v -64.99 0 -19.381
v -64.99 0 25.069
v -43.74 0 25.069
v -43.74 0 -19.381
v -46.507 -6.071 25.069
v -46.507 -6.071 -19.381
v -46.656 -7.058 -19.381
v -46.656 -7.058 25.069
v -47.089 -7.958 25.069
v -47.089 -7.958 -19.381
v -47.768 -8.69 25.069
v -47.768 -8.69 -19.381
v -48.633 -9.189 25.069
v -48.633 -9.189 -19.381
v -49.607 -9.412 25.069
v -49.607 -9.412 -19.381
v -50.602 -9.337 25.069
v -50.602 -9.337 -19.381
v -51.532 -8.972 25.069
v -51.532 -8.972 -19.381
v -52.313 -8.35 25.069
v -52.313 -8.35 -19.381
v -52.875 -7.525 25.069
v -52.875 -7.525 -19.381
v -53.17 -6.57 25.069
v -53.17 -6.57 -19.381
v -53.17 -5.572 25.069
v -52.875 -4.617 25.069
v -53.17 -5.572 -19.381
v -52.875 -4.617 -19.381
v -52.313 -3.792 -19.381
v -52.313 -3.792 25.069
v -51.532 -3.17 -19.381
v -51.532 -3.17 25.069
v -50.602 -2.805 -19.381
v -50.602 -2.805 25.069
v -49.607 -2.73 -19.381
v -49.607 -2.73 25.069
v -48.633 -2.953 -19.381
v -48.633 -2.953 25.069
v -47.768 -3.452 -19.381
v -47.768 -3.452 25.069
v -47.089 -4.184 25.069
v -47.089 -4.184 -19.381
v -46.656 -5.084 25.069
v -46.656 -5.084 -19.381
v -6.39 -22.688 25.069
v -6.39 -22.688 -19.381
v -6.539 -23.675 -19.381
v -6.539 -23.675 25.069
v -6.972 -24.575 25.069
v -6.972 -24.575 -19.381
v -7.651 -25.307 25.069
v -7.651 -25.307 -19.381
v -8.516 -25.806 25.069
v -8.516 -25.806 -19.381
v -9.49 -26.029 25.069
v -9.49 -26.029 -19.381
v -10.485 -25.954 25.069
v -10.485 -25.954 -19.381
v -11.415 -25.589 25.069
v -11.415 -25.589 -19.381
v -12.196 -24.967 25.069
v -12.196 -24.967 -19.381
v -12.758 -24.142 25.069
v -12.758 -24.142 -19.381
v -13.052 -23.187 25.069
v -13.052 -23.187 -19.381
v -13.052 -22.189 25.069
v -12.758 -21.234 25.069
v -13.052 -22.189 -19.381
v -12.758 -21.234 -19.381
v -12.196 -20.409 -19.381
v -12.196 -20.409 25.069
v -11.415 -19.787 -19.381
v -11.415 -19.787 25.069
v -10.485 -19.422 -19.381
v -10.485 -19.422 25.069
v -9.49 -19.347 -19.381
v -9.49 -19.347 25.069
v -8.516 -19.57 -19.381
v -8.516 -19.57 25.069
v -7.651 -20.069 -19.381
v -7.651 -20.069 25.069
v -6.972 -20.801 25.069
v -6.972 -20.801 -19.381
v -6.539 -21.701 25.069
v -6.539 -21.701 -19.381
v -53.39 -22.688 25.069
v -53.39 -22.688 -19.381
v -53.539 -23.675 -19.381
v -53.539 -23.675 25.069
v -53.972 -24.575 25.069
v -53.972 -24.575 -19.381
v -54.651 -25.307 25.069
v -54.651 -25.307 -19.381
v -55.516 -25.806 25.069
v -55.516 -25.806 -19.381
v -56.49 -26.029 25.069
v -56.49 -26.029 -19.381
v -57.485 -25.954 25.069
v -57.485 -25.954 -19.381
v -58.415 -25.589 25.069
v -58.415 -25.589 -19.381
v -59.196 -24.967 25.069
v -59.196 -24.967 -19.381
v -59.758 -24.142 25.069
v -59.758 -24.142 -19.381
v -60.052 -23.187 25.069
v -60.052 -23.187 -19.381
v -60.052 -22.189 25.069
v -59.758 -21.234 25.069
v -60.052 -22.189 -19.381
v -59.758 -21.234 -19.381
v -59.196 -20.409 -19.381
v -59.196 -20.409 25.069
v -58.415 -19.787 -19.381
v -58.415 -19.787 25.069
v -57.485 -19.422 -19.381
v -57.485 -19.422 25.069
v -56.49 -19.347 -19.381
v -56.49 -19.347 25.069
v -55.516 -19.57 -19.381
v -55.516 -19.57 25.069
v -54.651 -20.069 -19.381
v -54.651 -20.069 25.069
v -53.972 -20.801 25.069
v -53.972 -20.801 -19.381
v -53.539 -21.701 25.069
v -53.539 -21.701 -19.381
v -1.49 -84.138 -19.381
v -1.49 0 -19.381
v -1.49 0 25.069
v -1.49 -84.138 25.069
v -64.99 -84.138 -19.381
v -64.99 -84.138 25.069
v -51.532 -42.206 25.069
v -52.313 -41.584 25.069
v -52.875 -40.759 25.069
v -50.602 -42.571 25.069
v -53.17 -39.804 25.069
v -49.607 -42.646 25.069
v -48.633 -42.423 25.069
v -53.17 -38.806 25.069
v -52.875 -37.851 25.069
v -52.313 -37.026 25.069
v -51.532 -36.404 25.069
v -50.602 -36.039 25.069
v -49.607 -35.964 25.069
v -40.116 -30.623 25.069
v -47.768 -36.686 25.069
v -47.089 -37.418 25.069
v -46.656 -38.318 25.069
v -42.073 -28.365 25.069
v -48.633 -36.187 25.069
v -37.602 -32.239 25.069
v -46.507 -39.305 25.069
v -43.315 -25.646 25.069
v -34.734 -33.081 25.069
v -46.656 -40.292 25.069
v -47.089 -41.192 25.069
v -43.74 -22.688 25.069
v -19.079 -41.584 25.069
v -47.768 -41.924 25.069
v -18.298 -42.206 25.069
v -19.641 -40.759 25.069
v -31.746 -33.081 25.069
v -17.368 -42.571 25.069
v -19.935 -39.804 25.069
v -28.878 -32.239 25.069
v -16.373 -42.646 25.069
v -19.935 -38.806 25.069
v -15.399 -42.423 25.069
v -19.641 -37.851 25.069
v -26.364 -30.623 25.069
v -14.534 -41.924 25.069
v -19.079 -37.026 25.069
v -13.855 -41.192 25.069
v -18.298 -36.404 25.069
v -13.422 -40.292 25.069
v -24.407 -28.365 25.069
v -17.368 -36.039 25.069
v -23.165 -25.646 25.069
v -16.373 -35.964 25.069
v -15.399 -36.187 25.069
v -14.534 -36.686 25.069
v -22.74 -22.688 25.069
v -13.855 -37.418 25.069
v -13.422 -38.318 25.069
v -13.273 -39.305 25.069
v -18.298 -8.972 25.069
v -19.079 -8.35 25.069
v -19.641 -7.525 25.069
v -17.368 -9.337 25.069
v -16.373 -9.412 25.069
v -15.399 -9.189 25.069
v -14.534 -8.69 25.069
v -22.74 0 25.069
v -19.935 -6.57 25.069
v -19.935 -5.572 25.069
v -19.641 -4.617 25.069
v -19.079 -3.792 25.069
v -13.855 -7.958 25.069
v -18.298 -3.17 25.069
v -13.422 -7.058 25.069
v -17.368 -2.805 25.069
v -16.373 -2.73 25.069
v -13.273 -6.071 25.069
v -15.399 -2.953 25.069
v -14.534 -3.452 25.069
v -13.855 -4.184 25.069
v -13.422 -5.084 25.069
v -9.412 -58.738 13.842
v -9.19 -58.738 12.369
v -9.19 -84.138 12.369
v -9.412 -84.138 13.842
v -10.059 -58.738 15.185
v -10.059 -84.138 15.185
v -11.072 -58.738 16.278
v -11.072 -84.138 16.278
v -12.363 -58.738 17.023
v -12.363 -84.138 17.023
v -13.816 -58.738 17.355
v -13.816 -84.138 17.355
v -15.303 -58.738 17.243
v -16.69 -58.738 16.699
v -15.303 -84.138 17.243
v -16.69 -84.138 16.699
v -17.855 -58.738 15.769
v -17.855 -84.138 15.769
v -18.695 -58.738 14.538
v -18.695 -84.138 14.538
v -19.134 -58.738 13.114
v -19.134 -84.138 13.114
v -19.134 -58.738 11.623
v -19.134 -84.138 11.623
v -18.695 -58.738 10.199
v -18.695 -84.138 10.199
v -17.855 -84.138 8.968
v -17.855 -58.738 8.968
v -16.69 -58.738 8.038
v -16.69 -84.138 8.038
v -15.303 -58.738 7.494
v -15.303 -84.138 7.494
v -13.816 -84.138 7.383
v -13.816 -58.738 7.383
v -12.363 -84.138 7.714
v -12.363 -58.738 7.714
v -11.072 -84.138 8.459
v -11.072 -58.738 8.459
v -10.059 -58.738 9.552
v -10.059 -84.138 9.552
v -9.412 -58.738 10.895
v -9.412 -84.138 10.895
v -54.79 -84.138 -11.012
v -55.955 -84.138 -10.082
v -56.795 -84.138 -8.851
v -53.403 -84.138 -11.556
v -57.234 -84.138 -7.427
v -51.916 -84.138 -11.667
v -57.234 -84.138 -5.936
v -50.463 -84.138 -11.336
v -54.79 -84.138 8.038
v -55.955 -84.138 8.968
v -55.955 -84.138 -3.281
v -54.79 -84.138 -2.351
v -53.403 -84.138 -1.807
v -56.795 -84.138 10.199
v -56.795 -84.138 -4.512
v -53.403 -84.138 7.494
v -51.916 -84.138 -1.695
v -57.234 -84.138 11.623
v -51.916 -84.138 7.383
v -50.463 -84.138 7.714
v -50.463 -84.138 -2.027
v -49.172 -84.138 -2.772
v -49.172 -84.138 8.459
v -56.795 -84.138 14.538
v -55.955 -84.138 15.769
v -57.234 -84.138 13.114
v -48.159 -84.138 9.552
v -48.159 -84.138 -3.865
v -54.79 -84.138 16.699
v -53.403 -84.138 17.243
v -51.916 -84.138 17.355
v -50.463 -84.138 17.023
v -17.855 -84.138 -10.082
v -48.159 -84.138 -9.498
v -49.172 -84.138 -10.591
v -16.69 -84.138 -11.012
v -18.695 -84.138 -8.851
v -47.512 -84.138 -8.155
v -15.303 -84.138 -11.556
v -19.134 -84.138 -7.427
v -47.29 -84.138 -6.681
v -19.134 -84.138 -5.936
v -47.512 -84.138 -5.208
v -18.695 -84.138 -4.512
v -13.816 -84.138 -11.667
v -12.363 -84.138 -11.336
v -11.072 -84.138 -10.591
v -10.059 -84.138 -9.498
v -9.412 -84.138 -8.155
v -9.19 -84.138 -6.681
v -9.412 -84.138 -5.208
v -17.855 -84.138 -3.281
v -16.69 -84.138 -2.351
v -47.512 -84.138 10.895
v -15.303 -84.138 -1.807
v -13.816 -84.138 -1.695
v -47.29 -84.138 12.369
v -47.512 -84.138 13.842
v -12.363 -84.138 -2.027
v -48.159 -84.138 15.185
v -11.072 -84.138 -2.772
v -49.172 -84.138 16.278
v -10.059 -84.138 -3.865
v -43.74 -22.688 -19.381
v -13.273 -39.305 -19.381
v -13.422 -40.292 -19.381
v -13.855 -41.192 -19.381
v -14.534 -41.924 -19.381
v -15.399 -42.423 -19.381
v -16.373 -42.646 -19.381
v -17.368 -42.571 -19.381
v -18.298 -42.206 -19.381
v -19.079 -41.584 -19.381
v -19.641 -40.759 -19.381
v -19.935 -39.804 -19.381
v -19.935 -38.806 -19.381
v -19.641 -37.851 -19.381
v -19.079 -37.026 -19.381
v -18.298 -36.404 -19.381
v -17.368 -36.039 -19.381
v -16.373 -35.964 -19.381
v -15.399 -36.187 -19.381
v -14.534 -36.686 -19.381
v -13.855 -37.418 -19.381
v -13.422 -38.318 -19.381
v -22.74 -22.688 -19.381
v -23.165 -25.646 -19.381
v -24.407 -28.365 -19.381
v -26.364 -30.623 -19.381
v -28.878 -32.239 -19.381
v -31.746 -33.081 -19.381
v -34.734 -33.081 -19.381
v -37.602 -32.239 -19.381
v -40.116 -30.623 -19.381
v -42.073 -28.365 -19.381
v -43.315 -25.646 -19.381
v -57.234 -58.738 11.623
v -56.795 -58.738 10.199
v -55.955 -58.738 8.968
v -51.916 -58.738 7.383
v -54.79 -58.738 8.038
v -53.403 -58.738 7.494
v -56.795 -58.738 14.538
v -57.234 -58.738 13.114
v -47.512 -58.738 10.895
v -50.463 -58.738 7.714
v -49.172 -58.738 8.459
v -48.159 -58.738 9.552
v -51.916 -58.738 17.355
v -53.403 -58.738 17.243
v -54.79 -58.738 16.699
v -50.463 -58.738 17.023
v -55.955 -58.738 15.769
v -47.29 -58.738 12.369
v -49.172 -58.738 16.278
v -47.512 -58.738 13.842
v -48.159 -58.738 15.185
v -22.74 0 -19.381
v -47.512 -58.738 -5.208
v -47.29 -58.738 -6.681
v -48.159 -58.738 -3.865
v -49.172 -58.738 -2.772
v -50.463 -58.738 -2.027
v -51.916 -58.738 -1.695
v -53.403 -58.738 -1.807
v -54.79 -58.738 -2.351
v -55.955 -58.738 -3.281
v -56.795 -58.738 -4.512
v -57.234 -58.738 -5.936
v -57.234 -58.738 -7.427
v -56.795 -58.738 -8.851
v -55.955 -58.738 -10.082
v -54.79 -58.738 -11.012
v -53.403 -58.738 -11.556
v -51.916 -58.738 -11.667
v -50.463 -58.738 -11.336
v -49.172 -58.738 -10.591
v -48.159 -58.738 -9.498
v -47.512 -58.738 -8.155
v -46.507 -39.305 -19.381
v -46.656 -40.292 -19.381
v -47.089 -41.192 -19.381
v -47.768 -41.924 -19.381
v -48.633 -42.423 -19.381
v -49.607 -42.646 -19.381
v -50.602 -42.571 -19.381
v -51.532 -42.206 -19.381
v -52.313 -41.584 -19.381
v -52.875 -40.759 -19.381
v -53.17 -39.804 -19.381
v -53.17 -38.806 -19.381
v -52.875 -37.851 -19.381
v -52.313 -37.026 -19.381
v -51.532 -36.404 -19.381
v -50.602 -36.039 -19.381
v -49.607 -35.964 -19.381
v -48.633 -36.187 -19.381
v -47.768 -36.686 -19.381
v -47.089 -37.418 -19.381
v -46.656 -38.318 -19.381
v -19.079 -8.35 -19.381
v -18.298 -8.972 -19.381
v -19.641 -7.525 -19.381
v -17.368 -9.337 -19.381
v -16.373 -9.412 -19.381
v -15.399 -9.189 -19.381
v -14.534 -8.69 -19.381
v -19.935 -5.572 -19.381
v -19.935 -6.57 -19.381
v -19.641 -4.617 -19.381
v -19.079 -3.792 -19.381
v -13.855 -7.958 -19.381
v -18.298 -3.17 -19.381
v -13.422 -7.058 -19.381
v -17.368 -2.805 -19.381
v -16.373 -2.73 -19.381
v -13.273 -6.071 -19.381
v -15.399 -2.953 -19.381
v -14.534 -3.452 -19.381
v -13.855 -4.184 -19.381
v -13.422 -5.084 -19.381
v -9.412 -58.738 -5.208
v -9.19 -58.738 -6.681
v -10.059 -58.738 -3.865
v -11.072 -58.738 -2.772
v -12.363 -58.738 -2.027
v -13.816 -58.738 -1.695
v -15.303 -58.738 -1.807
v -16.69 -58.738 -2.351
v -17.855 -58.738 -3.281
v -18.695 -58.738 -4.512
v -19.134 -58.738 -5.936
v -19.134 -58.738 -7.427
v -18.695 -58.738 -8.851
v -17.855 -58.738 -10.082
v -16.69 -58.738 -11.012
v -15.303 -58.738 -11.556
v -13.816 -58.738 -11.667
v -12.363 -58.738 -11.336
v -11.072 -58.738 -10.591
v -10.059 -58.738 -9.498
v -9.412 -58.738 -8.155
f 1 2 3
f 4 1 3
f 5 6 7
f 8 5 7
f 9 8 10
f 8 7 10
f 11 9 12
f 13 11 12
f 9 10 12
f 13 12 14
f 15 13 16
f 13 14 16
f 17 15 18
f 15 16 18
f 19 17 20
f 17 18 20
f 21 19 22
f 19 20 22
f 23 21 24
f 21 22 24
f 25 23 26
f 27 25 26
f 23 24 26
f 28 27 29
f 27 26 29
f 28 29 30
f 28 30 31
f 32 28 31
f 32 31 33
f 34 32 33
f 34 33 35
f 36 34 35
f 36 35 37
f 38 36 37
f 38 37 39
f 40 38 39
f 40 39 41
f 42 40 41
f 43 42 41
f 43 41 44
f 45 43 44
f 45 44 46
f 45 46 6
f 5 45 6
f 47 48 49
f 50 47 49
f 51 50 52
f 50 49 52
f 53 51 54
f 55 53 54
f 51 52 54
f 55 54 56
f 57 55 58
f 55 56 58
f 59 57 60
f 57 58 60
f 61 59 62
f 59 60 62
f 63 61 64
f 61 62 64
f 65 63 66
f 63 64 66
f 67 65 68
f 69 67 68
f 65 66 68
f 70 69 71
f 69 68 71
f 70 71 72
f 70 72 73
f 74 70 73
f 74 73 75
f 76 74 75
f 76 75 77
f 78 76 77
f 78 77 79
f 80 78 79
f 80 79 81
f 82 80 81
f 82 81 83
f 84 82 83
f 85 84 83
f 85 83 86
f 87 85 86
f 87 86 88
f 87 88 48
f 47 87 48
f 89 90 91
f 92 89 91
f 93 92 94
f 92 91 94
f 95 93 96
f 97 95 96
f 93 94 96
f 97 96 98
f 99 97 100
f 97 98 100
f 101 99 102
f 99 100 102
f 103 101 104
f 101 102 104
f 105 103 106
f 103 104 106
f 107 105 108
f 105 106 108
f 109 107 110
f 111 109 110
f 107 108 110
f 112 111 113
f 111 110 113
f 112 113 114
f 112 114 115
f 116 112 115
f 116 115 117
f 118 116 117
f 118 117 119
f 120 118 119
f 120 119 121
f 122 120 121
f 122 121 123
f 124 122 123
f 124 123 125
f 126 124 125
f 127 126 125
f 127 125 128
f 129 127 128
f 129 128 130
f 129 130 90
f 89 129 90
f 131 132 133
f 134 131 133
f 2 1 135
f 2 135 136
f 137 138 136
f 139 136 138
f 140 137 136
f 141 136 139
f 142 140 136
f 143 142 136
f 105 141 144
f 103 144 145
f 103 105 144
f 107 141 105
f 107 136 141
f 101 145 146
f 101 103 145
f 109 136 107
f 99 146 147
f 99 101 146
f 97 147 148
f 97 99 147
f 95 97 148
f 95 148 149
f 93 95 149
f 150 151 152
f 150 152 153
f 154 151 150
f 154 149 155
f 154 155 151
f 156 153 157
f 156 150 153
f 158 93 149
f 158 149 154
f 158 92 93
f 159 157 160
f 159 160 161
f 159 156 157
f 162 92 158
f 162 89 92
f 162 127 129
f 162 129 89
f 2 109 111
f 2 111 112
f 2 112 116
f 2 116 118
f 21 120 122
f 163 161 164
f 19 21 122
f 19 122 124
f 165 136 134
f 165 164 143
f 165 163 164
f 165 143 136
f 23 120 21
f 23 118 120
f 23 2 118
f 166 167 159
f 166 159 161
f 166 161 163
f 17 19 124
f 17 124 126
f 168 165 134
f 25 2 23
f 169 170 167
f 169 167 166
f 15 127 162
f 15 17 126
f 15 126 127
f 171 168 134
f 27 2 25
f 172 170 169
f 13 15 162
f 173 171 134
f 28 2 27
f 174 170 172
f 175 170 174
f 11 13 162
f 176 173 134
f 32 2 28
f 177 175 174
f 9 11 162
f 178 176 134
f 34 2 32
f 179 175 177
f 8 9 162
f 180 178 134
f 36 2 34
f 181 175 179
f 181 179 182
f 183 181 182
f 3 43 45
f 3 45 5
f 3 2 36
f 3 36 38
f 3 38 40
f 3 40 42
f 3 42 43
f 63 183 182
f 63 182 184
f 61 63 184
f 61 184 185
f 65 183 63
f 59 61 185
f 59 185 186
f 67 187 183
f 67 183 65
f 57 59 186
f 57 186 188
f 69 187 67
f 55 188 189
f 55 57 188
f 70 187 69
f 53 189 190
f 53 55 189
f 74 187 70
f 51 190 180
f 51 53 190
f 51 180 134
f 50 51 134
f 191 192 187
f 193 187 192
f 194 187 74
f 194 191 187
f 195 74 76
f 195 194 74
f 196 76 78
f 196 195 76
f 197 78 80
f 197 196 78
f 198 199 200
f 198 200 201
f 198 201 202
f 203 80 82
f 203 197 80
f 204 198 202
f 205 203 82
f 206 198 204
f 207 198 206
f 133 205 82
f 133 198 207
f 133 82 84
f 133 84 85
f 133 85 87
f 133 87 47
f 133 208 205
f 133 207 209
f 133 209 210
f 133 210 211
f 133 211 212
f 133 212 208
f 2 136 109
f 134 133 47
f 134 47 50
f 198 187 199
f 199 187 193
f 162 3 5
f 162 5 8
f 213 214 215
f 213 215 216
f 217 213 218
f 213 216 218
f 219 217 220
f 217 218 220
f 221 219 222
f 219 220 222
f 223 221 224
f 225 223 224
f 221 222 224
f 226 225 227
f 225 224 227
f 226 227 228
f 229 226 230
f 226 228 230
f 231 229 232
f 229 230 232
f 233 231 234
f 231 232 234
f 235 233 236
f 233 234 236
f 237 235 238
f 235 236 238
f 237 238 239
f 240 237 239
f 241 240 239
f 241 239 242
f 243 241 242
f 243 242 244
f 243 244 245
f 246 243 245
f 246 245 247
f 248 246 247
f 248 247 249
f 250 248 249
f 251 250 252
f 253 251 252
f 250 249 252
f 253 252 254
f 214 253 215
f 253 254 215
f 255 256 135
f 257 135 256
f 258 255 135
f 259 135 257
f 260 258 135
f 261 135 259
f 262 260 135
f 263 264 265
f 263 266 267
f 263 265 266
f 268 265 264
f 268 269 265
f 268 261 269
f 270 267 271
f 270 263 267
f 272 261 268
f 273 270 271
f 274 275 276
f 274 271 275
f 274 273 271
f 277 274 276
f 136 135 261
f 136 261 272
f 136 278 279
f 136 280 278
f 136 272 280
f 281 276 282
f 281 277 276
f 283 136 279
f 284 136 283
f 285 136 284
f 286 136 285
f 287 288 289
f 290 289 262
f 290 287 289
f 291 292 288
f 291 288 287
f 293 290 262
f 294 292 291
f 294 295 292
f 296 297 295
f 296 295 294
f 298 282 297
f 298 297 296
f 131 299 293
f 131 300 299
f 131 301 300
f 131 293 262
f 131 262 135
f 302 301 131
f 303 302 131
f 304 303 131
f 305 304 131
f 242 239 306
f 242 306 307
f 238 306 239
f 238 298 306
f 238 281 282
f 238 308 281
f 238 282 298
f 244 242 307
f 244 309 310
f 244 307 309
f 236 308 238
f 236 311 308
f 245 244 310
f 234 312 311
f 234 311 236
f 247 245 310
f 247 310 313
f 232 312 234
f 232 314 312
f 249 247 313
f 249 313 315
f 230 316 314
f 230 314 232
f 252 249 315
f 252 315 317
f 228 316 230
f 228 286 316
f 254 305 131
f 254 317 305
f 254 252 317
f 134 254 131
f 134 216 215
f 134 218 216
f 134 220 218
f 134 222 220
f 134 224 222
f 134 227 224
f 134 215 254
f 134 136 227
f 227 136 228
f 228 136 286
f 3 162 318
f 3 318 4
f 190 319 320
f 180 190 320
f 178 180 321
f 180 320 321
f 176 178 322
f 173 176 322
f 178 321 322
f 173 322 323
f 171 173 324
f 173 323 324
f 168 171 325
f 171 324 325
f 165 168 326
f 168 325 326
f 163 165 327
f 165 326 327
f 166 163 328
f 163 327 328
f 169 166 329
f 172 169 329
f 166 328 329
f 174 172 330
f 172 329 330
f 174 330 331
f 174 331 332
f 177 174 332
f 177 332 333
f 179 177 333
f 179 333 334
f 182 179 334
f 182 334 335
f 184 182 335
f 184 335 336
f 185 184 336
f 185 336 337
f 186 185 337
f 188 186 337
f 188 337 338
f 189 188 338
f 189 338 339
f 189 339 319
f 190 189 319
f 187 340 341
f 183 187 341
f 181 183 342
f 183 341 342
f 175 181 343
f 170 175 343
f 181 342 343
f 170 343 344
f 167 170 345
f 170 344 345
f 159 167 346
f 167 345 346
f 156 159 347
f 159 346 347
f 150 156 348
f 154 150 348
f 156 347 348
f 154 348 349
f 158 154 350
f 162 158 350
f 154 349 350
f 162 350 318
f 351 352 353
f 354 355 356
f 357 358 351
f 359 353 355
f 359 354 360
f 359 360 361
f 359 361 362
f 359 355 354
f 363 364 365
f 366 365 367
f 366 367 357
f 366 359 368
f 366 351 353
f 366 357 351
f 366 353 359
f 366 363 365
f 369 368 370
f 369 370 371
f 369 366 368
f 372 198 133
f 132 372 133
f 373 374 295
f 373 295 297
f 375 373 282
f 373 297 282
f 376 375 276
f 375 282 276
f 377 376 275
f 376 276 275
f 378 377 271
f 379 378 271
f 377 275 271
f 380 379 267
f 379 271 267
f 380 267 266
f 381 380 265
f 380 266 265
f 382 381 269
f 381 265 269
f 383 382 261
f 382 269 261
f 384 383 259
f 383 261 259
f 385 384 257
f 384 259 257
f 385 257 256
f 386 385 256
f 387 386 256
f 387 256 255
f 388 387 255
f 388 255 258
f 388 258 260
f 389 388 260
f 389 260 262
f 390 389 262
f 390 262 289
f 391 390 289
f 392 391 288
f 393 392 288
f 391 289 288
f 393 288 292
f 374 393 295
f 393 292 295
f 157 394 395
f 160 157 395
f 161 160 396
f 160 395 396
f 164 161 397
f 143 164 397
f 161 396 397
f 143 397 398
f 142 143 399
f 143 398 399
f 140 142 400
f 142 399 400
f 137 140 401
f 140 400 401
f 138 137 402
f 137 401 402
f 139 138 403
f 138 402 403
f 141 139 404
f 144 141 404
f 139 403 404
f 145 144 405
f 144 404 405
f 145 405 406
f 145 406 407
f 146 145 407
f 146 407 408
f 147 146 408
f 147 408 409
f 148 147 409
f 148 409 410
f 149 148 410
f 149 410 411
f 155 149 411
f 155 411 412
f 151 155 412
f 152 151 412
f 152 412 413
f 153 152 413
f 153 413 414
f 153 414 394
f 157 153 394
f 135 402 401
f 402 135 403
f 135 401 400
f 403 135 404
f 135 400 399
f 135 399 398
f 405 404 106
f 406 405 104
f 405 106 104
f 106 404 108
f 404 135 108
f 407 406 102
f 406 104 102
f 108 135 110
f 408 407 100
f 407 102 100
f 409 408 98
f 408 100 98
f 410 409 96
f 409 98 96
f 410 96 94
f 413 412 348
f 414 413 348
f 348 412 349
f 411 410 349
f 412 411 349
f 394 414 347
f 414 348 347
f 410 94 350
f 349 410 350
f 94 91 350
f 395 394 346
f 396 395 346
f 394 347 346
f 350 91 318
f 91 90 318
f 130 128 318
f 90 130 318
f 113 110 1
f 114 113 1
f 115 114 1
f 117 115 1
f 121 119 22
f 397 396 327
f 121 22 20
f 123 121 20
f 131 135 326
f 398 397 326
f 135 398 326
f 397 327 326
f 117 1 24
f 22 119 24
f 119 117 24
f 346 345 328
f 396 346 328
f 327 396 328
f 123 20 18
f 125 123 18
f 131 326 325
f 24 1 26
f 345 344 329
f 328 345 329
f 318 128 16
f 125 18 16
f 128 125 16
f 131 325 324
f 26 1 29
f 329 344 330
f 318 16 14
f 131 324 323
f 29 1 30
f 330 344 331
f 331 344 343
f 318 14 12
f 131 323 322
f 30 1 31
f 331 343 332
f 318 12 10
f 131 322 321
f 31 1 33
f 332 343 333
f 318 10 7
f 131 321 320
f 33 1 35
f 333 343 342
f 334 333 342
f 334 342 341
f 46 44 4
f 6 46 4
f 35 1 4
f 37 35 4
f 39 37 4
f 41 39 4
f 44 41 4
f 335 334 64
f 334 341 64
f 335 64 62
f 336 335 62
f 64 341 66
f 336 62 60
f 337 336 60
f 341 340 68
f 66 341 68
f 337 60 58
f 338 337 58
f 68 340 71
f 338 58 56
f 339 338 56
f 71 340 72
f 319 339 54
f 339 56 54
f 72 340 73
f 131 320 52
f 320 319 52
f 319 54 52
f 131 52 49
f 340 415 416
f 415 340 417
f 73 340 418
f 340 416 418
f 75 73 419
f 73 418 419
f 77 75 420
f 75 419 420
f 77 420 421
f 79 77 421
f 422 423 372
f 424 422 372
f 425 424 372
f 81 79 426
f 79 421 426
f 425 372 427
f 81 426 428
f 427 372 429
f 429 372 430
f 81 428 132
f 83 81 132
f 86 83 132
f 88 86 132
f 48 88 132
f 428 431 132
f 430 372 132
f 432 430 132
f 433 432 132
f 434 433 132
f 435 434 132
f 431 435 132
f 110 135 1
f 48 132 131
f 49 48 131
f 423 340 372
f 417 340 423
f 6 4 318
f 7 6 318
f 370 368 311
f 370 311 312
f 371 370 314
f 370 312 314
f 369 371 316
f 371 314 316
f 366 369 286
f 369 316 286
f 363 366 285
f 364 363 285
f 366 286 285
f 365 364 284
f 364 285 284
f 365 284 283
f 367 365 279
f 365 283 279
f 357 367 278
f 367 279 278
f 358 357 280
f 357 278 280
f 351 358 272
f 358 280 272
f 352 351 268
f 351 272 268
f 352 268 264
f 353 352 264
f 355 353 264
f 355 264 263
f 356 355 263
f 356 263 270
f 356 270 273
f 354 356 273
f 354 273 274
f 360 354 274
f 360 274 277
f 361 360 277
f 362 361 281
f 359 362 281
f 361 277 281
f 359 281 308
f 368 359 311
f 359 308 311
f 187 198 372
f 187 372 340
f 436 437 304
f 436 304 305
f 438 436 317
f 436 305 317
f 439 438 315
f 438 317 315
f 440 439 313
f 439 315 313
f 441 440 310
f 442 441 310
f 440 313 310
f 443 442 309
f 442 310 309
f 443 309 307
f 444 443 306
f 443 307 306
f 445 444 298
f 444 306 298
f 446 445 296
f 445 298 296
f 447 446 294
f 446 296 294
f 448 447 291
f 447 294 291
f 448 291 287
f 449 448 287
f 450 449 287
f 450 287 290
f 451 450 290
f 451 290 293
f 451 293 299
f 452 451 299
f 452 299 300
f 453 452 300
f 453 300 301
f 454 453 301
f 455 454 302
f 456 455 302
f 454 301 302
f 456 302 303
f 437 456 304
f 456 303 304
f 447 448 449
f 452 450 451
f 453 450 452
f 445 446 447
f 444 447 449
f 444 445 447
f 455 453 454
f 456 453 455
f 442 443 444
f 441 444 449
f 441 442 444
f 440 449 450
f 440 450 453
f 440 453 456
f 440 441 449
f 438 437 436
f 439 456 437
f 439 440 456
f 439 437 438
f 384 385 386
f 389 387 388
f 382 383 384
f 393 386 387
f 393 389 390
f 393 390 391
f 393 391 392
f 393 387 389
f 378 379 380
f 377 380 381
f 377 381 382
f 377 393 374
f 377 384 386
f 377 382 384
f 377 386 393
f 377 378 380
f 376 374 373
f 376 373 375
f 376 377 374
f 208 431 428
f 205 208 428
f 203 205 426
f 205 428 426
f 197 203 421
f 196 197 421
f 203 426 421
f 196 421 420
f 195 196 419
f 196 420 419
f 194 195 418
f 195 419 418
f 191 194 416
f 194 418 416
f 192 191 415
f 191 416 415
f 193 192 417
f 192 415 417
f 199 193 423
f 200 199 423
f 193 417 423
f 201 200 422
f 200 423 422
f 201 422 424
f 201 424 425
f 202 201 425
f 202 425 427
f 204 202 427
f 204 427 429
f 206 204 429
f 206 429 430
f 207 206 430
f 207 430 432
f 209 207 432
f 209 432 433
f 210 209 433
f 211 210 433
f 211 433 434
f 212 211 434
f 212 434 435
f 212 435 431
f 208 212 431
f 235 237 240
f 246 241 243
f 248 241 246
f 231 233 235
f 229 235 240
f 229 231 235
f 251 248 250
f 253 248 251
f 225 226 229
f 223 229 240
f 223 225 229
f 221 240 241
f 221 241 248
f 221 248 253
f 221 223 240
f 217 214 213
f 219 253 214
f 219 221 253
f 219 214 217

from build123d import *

# Parameters (mm, degrees)
F0_W     = 63.5
F0_H     = 44.45
F1_DEPTH = 84.1375
F2_R     = 5
F3_DEPTH = 25.4
F4_R     = 3.35
F5_DEPTH = 44.451


with BuildPart() as f1:
    # F0 (on Front) → F1 (new body)
    with BuildSketch(Plane.XZ):
        with Locations((-33.239908, 2.843605)):
            Rectangle(F0_W, F0_H)
    extrude(amount=F1_DEPTH)

    # F2 (on face) → F3 (cut)
    with BuildSketch(Plane.XZ.offset(84.1375)):
        with Locations((-52.289908, 12.368605)):
            Circle(F2_R)
        with Locations((-52.289908, -6.681395)):
            Circle(F2_R)
        with Locations((-14.189908, 12.368605)):
            Circle(F2_R)
        with Locations((-14.189908, -6.681395)):
            Circle(F2_R)
    extrude(amount=-F3_DEPTH, mode=Mode.SUBTRACT)

    # F4 (on face) → F5 (cut, through all)
    with BuildSketch(Plane(origin=(0, 0, -19.381395), x_dir=(1, 0, 0), z_dir=(0, 0, -1))):
        with Locations((-56.739908, 22.688)):
            Circle(F4_R)
        with Locations((-49.856917, 6.070991)):
            Circle(F4_R)
        with Locations((-16.622898, 6.070991)):
            Circle(F4_R)
        with Locations((-9.739908, 22.688)):
            Circle(F4_R)
        with Locations((-16.622898, 39.305009)):
            Circle(F4_R)
        with Locations((-49.856917, 39.305009)):
            Circle(F4_R)
        with BuildLine():
            Line((-22.739908, 0), (-22.739908, 22.688))
            ThreePointArc((-22.739908, 22.688), (-33.239908, 33.188), (-43.739908, 22.688))
            Line((-43.739908, 22.688), (-43.739908, 0))
            Line((-43.739908, 0), (-22.739908, 0))
        make_face()
    extrude(amount=-F5_DEPTH, mode=Mode.SUBTRACT)


solid = f1.part
